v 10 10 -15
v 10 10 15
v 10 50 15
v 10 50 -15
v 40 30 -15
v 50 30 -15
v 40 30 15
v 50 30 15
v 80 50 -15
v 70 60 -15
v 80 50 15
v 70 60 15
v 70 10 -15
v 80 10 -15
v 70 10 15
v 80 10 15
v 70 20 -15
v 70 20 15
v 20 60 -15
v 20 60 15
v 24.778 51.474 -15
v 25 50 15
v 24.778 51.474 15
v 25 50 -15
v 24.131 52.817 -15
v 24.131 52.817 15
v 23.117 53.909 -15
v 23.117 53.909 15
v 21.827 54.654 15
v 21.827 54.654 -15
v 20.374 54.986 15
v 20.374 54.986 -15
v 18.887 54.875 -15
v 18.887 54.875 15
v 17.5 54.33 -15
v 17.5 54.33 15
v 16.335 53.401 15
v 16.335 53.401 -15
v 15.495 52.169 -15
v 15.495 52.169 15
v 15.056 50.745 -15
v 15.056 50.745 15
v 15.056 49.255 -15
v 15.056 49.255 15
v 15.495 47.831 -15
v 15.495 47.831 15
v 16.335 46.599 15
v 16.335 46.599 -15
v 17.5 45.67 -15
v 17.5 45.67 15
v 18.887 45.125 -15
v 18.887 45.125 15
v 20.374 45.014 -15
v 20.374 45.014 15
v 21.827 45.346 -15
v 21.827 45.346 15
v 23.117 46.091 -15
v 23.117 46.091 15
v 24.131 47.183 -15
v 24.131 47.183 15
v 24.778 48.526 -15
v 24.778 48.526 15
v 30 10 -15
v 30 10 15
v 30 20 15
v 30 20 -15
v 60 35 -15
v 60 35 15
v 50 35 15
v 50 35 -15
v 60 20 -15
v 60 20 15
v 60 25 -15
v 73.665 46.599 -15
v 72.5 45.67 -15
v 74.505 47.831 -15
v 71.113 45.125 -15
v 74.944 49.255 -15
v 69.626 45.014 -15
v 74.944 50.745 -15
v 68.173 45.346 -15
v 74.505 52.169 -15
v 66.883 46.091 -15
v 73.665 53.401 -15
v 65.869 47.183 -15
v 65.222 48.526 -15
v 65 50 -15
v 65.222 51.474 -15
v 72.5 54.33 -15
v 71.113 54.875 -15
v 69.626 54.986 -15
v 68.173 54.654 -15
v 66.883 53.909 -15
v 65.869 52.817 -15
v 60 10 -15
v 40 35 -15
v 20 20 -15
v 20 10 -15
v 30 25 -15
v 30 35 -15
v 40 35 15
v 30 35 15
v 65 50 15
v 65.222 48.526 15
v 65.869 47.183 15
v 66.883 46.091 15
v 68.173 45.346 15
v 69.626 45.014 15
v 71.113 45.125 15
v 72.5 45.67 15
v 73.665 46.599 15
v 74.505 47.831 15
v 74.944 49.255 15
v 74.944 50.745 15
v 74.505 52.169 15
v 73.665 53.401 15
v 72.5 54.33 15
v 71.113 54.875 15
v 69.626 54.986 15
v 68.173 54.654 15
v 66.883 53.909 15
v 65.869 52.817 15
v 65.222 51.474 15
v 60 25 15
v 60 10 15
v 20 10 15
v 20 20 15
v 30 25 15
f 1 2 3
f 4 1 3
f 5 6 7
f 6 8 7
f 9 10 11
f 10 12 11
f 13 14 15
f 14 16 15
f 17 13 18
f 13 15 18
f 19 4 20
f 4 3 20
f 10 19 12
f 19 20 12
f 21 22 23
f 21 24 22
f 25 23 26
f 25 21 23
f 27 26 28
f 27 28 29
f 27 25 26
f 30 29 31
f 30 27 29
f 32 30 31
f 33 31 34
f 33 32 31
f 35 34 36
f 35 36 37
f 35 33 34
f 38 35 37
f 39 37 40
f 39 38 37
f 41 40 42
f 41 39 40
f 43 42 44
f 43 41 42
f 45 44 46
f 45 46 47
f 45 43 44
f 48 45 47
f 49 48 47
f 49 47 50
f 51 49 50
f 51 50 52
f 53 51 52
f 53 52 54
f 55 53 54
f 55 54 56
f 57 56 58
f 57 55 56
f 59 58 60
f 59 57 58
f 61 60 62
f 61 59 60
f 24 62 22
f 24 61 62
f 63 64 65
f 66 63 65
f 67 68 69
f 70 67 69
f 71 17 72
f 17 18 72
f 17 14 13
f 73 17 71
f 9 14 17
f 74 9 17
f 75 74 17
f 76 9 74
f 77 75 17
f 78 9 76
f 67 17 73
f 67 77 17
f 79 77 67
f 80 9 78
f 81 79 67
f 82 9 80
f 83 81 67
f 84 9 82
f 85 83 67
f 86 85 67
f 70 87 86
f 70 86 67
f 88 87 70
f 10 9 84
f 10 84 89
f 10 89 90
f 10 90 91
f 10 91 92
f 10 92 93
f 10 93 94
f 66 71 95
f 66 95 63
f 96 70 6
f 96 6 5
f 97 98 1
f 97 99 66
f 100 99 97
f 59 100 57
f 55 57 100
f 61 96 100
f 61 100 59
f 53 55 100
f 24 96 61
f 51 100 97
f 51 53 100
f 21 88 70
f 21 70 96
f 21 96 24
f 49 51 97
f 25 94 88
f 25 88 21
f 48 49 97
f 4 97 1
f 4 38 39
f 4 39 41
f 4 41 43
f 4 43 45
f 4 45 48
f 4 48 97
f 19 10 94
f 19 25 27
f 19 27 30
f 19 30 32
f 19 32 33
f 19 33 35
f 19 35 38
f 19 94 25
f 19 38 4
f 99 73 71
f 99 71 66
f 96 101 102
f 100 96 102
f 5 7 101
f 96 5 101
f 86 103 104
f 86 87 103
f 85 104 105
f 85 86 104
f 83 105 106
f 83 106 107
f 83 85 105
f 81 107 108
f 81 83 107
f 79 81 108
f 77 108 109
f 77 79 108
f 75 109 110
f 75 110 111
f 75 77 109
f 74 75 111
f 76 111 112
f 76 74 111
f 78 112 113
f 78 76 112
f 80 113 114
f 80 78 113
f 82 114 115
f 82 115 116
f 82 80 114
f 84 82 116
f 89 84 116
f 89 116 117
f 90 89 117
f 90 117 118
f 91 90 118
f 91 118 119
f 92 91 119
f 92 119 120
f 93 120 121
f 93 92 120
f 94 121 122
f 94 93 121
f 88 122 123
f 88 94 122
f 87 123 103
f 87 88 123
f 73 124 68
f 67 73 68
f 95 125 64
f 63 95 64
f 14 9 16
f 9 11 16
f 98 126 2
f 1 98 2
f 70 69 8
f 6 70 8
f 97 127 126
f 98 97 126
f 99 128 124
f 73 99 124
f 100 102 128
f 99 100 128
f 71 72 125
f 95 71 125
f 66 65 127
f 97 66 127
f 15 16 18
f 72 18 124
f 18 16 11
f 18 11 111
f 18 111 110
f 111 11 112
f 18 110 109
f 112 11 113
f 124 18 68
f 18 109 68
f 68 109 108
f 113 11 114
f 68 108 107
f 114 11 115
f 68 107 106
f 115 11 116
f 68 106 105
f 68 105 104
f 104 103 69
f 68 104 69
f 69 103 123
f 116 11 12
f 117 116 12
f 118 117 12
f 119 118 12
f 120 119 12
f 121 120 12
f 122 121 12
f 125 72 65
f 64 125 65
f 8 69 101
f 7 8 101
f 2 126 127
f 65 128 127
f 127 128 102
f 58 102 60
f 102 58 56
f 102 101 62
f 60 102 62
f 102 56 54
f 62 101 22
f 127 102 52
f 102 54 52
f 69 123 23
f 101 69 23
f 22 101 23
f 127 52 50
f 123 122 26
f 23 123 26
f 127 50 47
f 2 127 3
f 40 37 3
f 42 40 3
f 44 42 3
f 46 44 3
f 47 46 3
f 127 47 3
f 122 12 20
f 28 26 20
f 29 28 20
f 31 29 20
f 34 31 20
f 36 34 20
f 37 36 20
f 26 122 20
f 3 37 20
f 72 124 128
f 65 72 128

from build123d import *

# Parameters (mm, degrees)
SKETCH2_R           = 5
BOSS_EXTRUDE2_DEPTH = 15


with BuildPart() as part:
    # Sketch2 → Boss-Extrude2 (new, symmetric)
    with BuildSketch(Plane.XY):
        Polygon((10, 10), (10, 50), (20, 60), (70, 60), (80, 50), (80, 10), (70, 10), (70, 20), (60, 20), (60, 10), (30, 10), (30, 20), (20, 20), (20, 10), align=None)
        with Locations((20, 50)):
            Circle(SKETCH2_R, mode=Mode.SUBTRACT)
        with Locations(Location((70, 50, 0), (0, 0, 180))):
            Circle(SKETCH2_R, mode=Mode.SUBTRACT)
        Polygon((50, 30), (40, 30), (40, 35), (30, 35), (30, 25), (60, 25), (60, 35), (50, 35), align=None, mode=Mode.SUBTRACT)
    extrude(amount=BOSS_EXTRUDE2_DEPTH, both=True)


solid = part.part
